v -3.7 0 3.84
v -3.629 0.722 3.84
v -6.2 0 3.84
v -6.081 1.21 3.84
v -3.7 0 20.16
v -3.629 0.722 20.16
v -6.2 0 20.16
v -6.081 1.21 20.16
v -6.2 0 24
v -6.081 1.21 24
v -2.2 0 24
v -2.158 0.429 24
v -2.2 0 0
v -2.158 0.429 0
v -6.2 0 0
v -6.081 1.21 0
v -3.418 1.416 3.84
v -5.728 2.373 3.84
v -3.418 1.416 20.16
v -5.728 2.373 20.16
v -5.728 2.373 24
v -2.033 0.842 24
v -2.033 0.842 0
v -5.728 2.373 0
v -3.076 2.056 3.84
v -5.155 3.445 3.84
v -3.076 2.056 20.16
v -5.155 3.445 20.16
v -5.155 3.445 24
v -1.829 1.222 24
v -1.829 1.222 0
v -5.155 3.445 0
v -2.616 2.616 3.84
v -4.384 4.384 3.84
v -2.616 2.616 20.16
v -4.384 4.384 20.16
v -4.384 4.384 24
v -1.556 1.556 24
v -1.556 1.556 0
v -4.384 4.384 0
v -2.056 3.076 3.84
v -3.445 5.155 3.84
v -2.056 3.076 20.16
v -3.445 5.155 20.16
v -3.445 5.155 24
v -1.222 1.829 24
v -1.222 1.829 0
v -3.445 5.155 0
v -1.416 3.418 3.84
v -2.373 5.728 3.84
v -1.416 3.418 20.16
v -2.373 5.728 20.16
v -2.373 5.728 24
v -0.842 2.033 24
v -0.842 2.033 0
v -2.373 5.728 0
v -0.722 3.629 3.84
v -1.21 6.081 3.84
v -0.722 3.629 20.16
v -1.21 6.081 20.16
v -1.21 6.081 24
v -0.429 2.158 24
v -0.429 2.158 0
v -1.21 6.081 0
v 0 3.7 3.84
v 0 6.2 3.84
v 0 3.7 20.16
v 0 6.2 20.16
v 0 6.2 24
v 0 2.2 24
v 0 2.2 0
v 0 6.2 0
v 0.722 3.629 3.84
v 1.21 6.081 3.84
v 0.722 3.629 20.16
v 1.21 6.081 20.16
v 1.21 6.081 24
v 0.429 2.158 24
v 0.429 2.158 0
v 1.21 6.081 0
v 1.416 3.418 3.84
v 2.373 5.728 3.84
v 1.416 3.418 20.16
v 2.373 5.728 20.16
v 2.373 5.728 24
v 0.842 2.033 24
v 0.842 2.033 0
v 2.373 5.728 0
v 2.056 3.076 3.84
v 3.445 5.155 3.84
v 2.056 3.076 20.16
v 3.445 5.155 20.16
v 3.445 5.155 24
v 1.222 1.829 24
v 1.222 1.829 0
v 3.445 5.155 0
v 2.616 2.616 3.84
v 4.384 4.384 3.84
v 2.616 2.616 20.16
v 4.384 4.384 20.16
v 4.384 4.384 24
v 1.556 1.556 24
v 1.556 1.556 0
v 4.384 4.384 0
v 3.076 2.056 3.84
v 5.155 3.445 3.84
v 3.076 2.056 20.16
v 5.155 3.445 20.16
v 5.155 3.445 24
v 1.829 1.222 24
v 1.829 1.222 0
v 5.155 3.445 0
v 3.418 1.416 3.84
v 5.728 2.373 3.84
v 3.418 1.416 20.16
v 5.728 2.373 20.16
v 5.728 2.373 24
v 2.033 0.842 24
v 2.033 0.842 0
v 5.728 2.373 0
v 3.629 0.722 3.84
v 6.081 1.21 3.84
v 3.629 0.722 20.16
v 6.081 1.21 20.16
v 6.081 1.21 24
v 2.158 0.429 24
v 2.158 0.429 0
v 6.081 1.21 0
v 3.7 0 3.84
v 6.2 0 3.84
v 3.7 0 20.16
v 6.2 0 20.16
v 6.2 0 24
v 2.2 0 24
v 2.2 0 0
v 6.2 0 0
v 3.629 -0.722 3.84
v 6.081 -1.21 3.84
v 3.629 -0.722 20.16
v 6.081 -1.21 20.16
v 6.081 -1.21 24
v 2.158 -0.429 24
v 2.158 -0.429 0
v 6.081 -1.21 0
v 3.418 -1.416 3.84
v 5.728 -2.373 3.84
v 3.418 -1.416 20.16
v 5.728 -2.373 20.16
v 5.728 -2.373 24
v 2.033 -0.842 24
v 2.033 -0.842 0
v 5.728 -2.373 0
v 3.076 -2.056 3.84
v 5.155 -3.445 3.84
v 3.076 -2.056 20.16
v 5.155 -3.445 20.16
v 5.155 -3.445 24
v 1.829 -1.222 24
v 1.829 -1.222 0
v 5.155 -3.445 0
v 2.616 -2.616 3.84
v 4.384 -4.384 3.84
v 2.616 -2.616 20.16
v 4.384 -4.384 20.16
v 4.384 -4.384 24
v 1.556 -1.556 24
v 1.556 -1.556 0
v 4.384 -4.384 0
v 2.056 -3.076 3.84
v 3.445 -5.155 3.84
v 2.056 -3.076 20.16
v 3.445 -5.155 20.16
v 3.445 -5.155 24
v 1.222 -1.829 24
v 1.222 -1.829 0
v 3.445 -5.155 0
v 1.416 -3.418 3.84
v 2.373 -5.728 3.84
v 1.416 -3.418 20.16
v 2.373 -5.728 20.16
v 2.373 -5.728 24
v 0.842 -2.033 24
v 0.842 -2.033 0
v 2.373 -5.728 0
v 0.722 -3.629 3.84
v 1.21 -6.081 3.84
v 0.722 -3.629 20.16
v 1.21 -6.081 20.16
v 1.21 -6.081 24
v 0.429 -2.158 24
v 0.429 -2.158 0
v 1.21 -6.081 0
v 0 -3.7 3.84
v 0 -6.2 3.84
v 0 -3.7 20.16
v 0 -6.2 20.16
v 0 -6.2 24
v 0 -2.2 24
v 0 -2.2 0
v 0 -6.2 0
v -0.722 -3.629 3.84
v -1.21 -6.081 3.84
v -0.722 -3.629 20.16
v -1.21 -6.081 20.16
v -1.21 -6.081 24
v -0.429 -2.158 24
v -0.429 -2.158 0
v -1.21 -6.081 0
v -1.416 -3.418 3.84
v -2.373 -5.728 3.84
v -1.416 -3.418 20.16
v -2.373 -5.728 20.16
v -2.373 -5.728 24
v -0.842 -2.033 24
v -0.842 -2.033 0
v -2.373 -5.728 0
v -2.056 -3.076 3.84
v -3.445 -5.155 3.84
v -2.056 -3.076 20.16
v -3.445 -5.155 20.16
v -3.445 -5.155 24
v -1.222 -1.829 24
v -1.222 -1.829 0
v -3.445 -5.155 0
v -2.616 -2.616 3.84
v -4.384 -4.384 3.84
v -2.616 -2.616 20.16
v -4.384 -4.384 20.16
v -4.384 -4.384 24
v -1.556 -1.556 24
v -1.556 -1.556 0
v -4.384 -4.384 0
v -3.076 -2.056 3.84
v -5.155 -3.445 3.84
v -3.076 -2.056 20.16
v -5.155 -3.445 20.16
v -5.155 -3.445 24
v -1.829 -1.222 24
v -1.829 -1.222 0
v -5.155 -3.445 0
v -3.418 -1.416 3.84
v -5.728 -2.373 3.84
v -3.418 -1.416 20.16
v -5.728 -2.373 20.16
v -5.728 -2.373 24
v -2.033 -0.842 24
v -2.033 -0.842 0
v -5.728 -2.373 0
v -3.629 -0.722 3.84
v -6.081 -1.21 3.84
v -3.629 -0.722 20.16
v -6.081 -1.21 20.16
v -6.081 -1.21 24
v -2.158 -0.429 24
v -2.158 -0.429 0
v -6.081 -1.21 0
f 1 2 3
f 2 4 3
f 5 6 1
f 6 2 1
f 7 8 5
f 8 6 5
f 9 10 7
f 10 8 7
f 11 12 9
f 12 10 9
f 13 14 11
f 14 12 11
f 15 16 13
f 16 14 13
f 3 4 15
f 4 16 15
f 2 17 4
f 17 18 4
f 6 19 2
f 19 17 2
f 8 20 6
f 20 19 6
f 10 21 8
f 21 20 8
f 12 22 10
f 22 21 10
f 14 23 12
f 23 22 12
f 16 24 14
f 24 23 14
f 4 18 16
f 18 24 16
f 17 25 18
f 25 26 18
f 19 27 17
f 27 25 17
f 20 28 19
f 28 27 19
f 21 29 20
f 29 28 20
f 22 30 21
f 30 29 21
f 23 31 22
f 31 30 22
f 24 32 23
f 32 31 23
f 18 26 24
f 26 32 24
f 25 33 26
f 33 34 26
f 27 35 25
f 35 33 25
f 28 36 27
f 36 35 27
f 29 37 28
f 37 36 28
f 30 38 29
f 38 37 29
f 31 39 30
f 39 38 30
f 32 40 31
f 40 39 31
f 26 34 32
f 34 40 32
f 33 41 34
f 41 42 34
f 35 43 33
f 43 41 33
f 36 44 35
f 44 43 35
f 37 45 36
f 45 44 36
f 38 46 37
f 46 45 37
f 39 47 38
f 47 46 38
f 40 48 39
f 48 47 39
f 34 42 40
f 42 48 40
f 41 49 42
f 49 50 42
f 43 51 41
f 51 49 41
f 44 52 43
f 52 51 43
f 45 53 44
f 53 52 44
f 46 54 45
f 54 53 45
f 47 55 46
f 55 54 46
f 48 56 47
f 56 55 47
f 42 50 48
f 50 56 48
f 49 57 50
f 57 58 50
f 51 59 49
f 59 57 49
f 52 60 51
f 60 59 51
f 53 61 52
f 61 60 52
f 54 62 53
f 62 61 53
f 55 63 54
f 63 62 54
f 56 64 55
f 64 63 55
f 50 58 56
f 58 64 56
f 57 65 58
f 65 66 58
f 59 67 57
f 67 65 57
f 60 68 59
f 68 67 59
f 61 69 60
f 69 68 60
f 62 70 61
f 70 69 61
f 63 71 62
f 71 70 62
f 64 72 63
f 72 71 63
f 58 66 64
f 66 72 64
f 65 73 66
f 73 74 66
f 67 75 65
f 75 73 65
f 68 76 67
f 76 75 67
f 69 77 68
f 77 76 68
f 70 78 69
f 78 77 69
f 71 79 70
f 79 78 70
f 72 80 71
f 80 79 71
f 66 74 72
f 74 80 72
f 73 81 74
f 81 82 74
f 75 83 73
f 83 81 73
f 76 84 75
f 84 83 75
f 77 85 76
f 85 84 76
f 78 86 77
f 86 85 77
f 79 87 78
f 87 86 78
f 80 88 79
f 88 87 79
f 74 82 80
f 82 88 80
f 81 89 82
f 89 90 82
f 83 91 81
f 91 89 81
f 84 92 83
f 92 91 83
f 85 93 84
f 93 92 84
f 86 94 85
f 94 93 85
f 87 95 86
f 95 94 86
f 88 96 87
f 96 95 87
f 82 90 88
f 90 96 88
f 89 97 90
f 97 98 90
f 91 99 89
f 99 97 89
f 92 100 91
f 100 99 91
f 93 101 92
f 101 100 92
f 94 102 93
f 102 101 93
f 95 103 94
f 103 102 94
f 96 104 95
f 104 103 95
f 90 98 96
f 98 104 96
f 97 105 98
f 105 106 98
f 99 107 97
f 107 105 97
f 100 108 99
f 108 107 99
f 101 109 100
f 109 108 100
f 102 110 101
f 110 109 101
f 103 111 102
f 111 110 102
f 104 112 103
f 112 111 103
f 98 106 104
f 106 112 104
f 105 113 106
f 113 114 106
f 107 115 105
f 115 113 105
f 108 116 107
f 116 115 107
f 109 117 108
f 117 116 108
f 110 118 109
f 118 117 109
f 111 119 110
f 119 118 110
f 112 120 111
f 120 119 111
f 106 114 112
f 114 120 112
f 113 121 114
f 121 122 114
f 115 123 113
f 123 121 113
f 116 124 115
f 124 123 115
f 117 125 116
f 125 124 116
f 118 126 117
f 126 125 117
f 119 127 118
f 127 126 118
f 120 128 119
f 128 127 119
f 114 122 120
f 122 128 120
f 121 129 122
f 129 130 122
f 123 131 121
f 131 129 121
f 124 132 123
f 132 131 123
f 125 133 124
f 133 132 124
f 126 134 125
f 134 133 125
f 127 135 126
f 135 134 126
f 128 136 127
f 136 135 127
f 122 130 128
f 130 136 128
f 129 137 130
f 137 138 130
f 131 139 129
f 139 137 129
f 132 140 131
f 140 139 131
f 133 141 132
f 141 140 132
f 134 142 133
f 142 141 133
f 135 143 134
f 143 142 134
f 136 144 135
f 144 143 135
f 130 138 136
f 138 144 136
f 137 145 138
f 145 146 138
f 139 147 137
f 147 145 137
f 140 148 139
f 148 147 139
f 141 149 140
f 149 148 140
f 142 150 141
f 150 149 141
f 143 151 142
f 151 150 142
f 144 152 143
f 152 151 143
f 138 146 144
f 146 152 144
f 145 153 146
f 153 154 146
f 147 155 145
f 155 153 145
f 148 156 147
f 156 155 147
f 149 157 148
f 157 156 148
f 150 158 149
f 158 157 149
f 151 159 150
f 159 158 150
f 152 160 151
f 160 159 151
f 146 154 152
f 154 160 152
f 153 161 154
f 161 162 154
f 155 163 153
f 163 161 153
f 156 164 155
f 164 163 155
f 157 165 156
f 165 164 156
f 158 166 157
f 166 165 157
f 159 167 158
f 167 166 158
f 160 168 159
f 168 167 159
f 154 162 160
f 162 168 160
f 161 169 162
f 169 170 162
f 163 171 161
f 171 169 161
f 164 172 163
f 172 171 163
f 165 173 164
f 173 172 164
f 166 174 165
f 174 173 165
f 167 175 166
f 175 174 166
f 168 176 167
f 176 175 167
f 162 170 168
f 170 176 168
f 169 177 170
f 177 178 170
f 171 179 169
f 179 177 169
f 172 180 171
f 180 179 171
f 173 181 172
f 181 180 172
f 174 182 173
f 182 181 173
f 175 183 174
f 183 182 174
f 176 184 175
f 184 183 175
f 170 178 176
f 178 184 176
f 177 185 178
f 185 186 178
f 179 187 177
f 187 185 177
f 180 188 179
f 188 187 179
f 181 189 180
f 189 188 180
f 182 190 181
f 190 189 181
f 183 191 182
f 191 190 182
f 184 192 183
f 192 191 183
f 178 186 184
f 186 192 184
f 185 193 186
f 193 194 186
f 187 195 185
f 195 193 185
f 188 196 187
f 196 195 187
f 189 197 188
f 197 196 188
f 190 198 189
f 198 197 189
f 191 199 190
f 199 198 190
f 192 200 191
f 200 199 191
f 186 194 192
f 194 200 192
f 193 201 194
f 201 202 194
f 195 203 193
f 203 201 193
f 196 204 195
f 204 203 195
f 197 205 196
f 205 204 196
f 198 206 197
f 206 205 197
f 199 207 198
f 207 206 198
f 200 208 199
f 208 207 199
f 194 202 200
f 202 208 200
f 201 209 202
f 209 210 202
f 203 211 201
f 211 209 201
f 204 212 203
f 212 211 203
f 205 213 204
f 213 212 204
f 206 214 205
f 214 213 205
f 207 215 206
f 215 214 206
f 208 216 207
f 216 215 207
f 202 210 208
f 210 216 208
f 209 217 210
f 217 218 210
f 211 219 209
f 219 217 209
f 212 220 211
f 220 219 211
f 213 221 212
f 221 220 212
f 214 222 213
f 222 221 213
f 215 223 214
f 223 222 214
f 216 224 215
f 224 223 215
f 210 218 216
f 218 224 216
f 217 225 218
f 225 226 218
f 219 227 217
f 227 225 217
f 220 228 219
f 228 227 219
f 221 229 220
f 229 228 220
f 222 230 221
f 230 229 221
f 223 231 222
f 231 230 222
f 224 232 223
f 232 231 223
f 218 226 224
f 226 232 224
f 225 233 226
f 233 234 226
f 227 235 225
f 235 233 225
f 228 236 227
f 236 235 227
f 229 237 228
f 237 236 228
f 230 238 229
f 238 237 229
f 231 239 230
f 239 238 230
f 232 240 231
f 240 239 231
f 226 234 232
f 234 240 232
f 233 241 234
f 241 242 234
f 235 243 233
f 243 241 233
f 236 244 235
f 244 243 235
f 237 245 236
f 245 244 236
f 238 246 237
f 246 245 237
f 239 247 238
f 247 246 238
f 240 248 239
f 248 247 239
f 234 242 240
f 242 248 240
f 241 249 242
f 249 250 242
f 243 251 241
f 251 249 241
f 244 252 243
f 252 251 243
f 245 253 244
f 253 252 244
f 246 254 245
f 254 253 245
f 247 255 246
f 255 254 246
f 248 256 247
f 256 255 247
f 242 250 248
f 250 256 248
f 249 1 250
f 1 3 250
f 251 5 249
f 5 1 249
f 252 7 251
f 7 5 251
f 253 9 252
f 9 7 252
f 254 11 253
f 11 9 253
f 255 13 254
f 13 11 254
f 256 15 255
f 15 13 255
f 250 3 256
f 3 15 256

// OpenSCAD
$fn = 32;

// ----------------------------------------------------------------------
// Profiled standoff: spool spacer, 24 mm long, bore 4.4 mm
// ----------------------------------------------------------------------

// --- parameters (mm) ---
revolve_angle = 360;      // full turn around the Z axis
profile_points = 8;       // points of the closed outline

profile = [[2.2, 0], [6.2, 0], [6.2, 3.84], [3.7, 3.84], [3.7, 20.16], [6.2, 20.16], [6.2, 24], [2.2, 24]];  // single closed polygon, 8 points, counter clockwise

// --- the one profile operation ---
rotate_extrude(angle = revolve_angle) polygon(points = profile);
